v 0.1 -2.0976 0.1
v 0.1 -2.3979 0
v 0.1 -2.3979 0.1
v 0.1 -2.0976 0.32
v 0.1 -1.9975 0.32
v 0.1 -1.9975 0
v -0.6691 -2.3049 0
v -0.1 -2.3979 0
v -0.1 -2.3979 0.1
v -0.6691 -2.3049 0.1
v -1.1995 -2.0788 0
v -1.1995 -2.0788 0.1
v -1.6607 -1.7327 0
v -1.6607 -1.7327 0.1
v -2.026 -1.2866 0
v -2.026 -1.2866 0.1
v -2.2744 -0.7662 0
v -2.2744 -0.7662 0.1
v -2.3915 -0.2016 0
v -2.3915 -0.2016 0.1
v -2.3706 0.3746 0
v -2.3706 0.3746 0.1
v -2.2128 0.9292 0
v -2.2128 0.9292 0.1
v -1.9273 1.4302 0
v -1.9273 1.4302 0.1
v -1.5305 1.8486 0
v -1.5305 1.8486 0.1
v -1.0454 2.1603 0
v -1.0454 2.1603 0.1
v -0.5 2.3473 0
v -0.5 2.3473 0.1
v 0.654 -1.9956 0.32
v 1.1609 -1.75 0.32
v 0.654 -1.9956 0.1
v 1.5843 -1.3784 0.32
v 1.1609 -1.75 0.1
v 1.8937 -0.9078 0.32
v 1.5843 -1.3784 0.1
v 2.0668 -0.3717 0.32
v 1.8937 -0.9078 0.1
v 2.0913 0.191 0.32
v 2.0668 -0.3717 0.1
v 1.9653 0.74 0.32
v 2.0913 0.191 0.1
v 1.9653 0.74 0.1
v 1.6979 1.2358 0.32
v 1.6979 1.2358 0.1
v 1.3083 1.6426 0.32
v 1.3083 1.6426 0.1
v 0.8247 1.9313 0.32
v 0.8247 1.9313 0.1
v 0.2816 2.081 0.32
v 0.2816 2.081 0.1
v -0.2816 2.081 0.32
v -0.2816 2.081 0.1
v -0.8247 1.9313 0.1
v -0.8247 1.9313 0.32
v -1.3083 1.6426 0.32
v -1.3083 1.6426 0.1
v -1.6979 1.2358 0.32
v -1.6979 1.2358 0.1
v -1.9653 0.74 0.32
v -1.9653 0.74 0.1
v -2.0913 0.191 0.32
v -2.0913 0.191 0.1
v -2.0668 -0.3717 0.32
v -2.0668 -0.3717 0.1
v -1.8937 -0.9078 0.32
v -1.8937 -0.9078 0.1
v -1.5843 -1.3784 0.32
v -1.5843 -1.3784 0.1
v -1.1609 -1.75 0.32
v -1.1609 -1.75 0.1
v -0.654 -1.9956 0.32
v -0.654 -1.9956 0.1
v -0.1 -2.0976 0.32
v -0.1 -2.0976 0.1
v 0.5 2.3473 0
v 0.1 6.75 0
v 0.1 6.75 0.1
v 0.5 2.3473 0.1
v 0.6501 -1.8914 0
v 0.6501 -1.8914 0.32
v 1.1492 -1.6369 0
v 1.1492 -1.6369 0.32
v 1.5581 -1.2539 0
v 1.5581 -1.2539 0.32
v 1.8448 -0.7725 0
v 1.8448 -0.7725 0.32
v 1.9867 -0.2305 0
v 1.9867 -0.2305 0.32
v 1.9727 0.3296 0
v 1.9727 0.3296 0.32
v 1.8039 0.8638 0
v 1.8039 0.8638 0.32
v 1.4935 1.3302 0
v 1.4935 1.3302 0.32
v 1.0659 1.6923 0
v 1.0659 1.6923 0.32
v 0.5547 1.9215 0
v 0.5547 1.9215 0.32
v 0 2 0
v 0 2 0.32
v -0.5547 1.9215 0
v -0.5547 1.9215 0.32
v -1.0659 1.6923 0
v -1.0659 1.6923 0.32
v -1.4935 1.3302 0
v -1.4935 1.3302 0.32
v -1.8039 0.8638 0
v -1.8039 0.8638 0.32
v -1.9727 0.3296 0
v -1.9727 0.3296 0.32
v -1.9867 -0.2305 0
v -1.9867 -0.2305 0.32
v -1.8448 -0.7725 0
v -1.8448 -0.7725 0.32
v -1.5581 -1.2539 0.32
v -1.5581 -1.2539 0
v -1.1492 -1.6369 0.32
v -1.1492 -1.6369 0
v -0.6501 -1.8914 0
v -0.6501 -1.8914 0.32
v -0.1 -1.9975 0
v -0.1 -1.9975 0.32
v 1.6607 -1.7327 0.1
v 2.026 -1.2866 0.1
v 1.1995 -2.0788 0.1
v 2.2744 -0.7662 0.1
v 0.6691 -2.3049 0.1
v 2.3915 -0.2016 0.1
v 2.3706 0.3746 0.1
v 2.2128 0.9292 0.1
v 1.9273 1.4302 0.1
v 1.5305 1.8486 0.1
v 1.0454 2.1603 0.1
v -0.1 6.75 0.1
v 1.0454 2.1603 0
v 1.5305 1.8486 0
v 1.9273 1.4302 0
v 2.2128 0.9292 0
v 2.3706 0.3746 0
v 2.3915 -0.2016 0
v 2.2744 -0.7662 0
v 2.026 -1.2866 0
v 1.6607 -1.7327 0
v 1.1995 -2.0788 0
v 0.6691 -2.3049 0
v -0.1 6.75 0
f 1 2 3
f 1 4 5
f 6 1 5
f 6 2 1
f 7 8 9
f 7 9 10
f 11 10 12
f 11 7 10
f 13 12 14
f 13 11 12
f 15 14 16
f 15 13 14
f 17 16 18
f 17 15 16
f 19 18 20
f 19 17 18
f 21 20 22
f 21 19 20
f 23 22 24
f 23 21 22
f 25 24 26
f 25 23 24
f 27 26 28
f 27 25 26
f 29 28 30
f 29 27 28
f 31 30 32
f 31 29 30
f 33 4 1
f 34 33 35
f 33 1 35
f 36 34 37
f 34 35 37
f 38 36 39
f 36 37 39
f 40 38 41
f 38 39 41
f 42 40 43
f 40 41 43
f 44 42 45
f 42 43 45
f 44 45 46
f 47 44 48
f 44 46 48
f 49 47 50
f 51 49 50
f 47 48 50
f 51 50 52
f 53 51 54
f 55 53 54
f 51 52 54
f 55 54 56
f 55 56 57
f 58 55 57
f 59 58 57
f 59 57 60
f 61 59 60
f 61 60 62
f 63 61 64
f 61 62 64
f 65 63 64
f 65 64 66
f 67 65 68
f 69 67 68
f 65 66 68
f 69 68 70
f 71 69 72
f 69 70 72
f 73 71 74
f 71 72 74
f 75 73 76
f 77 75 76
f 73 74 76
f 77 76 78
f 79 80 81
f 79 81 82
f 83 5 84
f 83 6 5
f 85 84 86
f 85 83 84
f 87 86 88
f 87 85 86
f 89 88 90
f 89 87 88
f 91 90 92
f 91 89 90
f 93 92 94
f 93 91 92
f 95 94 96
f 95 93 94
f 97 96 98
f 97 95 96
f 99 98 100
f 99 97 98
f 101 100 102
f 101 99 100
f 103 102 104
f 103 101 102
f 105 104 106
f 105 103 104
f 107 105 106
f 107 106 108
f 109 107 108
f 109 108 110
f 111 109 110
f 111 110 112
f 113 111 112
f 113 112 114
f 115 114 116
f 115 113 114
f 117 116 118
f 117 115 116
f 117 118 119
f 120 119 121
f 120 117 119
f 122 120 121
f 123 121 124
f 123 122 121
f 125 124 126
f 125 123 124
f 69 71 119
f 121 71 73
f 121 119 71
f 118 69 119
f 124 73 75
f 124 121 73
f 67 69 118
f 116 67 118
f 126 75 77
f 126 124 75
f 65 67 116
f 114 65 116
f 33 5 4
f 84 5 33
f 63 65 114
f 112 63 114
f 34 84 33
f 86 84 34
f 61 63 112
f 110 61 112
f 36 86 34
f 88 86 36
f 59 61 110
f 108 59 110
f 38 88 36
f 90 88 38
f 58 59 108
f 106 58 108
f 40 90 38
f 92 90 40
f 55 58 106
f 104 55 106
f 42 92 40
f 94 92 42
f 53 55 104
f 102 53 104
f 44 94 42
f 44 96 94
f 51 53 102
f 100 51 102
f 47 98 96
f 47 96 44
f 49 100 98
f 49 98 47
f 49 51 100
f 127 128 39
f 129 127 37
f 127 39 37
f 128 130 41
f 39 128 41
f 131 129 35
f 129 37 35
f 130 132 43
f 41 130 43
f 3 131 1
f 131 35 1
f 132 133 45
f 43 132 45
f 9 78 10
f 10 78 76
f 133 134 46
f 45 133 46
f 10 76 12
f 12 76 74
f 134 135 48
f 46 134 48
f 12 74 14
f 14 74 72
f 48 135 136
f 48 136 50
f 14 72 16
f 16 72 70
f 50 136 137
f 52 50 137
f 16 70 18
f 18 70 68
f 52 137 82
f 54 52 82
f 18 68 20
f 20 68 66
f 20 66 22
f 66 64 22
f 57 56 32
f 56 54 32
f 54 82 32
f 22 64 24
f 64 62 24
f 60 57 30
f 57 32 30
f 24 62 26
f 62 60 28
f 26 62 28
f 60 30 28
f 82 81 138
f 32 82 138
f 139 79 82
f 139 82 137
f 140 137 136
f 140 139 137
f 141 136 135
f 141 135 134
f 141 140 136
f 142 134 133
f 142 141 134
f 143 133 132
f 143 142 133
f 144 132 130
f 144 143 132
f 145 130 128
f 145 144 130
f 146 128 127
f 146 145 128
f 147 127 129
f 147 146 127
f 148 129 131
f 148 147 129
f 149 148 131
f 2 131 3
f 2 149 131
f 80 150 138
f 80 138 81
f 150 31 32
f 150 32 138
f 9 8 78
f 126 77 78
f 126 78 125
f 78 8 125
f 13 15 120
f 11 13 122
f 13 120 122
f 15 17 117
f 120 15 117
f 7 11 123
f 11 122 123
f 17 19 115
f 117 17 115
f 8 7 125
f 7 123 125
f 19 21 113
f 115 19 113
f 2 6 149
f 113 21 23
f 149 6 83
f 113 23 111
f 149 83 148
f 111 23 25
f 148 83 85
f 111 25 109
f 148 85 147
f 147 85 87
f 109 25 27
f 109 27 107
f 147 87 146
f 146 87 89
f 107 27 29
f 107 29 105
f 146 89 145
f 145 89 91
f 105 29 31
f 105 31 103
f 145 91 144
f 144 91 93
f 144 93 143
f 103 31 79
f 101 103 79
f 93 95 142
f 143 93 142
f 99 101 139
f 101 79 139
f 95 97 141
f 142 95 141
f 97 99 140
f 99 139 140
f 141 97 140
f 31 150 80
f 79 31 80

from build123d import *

# Parameters (mm, degrees)
BOSS_EXTRUDE1_DEPTH = 0.1
SKETCH3_R           = 2.1
BOSS_EXTRUDE2_DEPTH = 0.32
SKETCH4_R           = 2
CUT_EXTRUDE1_DEPTH  = 1.32
SKETCH5_W           = 0.2
SKETCH5_H           = 0.897152977
CUT_EXTRUDE2_DEPTH  = 1.32


with BuildPart() as part:
    # Sketch1 → Boss-Extrude1 (new body)
    with BuildSketch(Plane.XY):
        with BuildLine():
            Line((0, 6.75), (0.1, 6.75))
            Line((0.1, 6.75), (0.5, 2.347338919))
            ThreePointArc((0.5, 2.347338919), (0, -2.4), (-0.5, 2.347338919))
            Line((-0.5, 2.347338919), (-0.1, 6.75))
            Line((-0.1, 6.75), (0, 6.75))
        make_face()
    extrude(amount=BOSS_EXTRUDE1_DEPTH)

    # Sketch3 → Boss-Extrude2 (add)
    with BuildSketch(Plane.XY):
        Circle(SKETCH3_R)
    extrude(amount=BOSS_EXTRUDE2_DEPTH)

    # Sketch4 → Cut-Extrude1 (cut, through all)
    with BuildSketch(Plane.XY):
        Circle(SKETCH4_R)
    extrude(amount=CUT_EXTRUDE1_DEPTH, mode=Mode.SUBTRACT)

    # Sketch5 → Cut-Extrude2 (cut, through all)
    with BuildSketch(Plane.XY):
        with Locations((0, -2.259612308)):
            Rectangle(SKETCH5_W, SKETCH5_H)
    extrude(amount=CUT_EXTRUDE2_DEPTH, mode=Mode.SUBTRACT)


solid = part.part
